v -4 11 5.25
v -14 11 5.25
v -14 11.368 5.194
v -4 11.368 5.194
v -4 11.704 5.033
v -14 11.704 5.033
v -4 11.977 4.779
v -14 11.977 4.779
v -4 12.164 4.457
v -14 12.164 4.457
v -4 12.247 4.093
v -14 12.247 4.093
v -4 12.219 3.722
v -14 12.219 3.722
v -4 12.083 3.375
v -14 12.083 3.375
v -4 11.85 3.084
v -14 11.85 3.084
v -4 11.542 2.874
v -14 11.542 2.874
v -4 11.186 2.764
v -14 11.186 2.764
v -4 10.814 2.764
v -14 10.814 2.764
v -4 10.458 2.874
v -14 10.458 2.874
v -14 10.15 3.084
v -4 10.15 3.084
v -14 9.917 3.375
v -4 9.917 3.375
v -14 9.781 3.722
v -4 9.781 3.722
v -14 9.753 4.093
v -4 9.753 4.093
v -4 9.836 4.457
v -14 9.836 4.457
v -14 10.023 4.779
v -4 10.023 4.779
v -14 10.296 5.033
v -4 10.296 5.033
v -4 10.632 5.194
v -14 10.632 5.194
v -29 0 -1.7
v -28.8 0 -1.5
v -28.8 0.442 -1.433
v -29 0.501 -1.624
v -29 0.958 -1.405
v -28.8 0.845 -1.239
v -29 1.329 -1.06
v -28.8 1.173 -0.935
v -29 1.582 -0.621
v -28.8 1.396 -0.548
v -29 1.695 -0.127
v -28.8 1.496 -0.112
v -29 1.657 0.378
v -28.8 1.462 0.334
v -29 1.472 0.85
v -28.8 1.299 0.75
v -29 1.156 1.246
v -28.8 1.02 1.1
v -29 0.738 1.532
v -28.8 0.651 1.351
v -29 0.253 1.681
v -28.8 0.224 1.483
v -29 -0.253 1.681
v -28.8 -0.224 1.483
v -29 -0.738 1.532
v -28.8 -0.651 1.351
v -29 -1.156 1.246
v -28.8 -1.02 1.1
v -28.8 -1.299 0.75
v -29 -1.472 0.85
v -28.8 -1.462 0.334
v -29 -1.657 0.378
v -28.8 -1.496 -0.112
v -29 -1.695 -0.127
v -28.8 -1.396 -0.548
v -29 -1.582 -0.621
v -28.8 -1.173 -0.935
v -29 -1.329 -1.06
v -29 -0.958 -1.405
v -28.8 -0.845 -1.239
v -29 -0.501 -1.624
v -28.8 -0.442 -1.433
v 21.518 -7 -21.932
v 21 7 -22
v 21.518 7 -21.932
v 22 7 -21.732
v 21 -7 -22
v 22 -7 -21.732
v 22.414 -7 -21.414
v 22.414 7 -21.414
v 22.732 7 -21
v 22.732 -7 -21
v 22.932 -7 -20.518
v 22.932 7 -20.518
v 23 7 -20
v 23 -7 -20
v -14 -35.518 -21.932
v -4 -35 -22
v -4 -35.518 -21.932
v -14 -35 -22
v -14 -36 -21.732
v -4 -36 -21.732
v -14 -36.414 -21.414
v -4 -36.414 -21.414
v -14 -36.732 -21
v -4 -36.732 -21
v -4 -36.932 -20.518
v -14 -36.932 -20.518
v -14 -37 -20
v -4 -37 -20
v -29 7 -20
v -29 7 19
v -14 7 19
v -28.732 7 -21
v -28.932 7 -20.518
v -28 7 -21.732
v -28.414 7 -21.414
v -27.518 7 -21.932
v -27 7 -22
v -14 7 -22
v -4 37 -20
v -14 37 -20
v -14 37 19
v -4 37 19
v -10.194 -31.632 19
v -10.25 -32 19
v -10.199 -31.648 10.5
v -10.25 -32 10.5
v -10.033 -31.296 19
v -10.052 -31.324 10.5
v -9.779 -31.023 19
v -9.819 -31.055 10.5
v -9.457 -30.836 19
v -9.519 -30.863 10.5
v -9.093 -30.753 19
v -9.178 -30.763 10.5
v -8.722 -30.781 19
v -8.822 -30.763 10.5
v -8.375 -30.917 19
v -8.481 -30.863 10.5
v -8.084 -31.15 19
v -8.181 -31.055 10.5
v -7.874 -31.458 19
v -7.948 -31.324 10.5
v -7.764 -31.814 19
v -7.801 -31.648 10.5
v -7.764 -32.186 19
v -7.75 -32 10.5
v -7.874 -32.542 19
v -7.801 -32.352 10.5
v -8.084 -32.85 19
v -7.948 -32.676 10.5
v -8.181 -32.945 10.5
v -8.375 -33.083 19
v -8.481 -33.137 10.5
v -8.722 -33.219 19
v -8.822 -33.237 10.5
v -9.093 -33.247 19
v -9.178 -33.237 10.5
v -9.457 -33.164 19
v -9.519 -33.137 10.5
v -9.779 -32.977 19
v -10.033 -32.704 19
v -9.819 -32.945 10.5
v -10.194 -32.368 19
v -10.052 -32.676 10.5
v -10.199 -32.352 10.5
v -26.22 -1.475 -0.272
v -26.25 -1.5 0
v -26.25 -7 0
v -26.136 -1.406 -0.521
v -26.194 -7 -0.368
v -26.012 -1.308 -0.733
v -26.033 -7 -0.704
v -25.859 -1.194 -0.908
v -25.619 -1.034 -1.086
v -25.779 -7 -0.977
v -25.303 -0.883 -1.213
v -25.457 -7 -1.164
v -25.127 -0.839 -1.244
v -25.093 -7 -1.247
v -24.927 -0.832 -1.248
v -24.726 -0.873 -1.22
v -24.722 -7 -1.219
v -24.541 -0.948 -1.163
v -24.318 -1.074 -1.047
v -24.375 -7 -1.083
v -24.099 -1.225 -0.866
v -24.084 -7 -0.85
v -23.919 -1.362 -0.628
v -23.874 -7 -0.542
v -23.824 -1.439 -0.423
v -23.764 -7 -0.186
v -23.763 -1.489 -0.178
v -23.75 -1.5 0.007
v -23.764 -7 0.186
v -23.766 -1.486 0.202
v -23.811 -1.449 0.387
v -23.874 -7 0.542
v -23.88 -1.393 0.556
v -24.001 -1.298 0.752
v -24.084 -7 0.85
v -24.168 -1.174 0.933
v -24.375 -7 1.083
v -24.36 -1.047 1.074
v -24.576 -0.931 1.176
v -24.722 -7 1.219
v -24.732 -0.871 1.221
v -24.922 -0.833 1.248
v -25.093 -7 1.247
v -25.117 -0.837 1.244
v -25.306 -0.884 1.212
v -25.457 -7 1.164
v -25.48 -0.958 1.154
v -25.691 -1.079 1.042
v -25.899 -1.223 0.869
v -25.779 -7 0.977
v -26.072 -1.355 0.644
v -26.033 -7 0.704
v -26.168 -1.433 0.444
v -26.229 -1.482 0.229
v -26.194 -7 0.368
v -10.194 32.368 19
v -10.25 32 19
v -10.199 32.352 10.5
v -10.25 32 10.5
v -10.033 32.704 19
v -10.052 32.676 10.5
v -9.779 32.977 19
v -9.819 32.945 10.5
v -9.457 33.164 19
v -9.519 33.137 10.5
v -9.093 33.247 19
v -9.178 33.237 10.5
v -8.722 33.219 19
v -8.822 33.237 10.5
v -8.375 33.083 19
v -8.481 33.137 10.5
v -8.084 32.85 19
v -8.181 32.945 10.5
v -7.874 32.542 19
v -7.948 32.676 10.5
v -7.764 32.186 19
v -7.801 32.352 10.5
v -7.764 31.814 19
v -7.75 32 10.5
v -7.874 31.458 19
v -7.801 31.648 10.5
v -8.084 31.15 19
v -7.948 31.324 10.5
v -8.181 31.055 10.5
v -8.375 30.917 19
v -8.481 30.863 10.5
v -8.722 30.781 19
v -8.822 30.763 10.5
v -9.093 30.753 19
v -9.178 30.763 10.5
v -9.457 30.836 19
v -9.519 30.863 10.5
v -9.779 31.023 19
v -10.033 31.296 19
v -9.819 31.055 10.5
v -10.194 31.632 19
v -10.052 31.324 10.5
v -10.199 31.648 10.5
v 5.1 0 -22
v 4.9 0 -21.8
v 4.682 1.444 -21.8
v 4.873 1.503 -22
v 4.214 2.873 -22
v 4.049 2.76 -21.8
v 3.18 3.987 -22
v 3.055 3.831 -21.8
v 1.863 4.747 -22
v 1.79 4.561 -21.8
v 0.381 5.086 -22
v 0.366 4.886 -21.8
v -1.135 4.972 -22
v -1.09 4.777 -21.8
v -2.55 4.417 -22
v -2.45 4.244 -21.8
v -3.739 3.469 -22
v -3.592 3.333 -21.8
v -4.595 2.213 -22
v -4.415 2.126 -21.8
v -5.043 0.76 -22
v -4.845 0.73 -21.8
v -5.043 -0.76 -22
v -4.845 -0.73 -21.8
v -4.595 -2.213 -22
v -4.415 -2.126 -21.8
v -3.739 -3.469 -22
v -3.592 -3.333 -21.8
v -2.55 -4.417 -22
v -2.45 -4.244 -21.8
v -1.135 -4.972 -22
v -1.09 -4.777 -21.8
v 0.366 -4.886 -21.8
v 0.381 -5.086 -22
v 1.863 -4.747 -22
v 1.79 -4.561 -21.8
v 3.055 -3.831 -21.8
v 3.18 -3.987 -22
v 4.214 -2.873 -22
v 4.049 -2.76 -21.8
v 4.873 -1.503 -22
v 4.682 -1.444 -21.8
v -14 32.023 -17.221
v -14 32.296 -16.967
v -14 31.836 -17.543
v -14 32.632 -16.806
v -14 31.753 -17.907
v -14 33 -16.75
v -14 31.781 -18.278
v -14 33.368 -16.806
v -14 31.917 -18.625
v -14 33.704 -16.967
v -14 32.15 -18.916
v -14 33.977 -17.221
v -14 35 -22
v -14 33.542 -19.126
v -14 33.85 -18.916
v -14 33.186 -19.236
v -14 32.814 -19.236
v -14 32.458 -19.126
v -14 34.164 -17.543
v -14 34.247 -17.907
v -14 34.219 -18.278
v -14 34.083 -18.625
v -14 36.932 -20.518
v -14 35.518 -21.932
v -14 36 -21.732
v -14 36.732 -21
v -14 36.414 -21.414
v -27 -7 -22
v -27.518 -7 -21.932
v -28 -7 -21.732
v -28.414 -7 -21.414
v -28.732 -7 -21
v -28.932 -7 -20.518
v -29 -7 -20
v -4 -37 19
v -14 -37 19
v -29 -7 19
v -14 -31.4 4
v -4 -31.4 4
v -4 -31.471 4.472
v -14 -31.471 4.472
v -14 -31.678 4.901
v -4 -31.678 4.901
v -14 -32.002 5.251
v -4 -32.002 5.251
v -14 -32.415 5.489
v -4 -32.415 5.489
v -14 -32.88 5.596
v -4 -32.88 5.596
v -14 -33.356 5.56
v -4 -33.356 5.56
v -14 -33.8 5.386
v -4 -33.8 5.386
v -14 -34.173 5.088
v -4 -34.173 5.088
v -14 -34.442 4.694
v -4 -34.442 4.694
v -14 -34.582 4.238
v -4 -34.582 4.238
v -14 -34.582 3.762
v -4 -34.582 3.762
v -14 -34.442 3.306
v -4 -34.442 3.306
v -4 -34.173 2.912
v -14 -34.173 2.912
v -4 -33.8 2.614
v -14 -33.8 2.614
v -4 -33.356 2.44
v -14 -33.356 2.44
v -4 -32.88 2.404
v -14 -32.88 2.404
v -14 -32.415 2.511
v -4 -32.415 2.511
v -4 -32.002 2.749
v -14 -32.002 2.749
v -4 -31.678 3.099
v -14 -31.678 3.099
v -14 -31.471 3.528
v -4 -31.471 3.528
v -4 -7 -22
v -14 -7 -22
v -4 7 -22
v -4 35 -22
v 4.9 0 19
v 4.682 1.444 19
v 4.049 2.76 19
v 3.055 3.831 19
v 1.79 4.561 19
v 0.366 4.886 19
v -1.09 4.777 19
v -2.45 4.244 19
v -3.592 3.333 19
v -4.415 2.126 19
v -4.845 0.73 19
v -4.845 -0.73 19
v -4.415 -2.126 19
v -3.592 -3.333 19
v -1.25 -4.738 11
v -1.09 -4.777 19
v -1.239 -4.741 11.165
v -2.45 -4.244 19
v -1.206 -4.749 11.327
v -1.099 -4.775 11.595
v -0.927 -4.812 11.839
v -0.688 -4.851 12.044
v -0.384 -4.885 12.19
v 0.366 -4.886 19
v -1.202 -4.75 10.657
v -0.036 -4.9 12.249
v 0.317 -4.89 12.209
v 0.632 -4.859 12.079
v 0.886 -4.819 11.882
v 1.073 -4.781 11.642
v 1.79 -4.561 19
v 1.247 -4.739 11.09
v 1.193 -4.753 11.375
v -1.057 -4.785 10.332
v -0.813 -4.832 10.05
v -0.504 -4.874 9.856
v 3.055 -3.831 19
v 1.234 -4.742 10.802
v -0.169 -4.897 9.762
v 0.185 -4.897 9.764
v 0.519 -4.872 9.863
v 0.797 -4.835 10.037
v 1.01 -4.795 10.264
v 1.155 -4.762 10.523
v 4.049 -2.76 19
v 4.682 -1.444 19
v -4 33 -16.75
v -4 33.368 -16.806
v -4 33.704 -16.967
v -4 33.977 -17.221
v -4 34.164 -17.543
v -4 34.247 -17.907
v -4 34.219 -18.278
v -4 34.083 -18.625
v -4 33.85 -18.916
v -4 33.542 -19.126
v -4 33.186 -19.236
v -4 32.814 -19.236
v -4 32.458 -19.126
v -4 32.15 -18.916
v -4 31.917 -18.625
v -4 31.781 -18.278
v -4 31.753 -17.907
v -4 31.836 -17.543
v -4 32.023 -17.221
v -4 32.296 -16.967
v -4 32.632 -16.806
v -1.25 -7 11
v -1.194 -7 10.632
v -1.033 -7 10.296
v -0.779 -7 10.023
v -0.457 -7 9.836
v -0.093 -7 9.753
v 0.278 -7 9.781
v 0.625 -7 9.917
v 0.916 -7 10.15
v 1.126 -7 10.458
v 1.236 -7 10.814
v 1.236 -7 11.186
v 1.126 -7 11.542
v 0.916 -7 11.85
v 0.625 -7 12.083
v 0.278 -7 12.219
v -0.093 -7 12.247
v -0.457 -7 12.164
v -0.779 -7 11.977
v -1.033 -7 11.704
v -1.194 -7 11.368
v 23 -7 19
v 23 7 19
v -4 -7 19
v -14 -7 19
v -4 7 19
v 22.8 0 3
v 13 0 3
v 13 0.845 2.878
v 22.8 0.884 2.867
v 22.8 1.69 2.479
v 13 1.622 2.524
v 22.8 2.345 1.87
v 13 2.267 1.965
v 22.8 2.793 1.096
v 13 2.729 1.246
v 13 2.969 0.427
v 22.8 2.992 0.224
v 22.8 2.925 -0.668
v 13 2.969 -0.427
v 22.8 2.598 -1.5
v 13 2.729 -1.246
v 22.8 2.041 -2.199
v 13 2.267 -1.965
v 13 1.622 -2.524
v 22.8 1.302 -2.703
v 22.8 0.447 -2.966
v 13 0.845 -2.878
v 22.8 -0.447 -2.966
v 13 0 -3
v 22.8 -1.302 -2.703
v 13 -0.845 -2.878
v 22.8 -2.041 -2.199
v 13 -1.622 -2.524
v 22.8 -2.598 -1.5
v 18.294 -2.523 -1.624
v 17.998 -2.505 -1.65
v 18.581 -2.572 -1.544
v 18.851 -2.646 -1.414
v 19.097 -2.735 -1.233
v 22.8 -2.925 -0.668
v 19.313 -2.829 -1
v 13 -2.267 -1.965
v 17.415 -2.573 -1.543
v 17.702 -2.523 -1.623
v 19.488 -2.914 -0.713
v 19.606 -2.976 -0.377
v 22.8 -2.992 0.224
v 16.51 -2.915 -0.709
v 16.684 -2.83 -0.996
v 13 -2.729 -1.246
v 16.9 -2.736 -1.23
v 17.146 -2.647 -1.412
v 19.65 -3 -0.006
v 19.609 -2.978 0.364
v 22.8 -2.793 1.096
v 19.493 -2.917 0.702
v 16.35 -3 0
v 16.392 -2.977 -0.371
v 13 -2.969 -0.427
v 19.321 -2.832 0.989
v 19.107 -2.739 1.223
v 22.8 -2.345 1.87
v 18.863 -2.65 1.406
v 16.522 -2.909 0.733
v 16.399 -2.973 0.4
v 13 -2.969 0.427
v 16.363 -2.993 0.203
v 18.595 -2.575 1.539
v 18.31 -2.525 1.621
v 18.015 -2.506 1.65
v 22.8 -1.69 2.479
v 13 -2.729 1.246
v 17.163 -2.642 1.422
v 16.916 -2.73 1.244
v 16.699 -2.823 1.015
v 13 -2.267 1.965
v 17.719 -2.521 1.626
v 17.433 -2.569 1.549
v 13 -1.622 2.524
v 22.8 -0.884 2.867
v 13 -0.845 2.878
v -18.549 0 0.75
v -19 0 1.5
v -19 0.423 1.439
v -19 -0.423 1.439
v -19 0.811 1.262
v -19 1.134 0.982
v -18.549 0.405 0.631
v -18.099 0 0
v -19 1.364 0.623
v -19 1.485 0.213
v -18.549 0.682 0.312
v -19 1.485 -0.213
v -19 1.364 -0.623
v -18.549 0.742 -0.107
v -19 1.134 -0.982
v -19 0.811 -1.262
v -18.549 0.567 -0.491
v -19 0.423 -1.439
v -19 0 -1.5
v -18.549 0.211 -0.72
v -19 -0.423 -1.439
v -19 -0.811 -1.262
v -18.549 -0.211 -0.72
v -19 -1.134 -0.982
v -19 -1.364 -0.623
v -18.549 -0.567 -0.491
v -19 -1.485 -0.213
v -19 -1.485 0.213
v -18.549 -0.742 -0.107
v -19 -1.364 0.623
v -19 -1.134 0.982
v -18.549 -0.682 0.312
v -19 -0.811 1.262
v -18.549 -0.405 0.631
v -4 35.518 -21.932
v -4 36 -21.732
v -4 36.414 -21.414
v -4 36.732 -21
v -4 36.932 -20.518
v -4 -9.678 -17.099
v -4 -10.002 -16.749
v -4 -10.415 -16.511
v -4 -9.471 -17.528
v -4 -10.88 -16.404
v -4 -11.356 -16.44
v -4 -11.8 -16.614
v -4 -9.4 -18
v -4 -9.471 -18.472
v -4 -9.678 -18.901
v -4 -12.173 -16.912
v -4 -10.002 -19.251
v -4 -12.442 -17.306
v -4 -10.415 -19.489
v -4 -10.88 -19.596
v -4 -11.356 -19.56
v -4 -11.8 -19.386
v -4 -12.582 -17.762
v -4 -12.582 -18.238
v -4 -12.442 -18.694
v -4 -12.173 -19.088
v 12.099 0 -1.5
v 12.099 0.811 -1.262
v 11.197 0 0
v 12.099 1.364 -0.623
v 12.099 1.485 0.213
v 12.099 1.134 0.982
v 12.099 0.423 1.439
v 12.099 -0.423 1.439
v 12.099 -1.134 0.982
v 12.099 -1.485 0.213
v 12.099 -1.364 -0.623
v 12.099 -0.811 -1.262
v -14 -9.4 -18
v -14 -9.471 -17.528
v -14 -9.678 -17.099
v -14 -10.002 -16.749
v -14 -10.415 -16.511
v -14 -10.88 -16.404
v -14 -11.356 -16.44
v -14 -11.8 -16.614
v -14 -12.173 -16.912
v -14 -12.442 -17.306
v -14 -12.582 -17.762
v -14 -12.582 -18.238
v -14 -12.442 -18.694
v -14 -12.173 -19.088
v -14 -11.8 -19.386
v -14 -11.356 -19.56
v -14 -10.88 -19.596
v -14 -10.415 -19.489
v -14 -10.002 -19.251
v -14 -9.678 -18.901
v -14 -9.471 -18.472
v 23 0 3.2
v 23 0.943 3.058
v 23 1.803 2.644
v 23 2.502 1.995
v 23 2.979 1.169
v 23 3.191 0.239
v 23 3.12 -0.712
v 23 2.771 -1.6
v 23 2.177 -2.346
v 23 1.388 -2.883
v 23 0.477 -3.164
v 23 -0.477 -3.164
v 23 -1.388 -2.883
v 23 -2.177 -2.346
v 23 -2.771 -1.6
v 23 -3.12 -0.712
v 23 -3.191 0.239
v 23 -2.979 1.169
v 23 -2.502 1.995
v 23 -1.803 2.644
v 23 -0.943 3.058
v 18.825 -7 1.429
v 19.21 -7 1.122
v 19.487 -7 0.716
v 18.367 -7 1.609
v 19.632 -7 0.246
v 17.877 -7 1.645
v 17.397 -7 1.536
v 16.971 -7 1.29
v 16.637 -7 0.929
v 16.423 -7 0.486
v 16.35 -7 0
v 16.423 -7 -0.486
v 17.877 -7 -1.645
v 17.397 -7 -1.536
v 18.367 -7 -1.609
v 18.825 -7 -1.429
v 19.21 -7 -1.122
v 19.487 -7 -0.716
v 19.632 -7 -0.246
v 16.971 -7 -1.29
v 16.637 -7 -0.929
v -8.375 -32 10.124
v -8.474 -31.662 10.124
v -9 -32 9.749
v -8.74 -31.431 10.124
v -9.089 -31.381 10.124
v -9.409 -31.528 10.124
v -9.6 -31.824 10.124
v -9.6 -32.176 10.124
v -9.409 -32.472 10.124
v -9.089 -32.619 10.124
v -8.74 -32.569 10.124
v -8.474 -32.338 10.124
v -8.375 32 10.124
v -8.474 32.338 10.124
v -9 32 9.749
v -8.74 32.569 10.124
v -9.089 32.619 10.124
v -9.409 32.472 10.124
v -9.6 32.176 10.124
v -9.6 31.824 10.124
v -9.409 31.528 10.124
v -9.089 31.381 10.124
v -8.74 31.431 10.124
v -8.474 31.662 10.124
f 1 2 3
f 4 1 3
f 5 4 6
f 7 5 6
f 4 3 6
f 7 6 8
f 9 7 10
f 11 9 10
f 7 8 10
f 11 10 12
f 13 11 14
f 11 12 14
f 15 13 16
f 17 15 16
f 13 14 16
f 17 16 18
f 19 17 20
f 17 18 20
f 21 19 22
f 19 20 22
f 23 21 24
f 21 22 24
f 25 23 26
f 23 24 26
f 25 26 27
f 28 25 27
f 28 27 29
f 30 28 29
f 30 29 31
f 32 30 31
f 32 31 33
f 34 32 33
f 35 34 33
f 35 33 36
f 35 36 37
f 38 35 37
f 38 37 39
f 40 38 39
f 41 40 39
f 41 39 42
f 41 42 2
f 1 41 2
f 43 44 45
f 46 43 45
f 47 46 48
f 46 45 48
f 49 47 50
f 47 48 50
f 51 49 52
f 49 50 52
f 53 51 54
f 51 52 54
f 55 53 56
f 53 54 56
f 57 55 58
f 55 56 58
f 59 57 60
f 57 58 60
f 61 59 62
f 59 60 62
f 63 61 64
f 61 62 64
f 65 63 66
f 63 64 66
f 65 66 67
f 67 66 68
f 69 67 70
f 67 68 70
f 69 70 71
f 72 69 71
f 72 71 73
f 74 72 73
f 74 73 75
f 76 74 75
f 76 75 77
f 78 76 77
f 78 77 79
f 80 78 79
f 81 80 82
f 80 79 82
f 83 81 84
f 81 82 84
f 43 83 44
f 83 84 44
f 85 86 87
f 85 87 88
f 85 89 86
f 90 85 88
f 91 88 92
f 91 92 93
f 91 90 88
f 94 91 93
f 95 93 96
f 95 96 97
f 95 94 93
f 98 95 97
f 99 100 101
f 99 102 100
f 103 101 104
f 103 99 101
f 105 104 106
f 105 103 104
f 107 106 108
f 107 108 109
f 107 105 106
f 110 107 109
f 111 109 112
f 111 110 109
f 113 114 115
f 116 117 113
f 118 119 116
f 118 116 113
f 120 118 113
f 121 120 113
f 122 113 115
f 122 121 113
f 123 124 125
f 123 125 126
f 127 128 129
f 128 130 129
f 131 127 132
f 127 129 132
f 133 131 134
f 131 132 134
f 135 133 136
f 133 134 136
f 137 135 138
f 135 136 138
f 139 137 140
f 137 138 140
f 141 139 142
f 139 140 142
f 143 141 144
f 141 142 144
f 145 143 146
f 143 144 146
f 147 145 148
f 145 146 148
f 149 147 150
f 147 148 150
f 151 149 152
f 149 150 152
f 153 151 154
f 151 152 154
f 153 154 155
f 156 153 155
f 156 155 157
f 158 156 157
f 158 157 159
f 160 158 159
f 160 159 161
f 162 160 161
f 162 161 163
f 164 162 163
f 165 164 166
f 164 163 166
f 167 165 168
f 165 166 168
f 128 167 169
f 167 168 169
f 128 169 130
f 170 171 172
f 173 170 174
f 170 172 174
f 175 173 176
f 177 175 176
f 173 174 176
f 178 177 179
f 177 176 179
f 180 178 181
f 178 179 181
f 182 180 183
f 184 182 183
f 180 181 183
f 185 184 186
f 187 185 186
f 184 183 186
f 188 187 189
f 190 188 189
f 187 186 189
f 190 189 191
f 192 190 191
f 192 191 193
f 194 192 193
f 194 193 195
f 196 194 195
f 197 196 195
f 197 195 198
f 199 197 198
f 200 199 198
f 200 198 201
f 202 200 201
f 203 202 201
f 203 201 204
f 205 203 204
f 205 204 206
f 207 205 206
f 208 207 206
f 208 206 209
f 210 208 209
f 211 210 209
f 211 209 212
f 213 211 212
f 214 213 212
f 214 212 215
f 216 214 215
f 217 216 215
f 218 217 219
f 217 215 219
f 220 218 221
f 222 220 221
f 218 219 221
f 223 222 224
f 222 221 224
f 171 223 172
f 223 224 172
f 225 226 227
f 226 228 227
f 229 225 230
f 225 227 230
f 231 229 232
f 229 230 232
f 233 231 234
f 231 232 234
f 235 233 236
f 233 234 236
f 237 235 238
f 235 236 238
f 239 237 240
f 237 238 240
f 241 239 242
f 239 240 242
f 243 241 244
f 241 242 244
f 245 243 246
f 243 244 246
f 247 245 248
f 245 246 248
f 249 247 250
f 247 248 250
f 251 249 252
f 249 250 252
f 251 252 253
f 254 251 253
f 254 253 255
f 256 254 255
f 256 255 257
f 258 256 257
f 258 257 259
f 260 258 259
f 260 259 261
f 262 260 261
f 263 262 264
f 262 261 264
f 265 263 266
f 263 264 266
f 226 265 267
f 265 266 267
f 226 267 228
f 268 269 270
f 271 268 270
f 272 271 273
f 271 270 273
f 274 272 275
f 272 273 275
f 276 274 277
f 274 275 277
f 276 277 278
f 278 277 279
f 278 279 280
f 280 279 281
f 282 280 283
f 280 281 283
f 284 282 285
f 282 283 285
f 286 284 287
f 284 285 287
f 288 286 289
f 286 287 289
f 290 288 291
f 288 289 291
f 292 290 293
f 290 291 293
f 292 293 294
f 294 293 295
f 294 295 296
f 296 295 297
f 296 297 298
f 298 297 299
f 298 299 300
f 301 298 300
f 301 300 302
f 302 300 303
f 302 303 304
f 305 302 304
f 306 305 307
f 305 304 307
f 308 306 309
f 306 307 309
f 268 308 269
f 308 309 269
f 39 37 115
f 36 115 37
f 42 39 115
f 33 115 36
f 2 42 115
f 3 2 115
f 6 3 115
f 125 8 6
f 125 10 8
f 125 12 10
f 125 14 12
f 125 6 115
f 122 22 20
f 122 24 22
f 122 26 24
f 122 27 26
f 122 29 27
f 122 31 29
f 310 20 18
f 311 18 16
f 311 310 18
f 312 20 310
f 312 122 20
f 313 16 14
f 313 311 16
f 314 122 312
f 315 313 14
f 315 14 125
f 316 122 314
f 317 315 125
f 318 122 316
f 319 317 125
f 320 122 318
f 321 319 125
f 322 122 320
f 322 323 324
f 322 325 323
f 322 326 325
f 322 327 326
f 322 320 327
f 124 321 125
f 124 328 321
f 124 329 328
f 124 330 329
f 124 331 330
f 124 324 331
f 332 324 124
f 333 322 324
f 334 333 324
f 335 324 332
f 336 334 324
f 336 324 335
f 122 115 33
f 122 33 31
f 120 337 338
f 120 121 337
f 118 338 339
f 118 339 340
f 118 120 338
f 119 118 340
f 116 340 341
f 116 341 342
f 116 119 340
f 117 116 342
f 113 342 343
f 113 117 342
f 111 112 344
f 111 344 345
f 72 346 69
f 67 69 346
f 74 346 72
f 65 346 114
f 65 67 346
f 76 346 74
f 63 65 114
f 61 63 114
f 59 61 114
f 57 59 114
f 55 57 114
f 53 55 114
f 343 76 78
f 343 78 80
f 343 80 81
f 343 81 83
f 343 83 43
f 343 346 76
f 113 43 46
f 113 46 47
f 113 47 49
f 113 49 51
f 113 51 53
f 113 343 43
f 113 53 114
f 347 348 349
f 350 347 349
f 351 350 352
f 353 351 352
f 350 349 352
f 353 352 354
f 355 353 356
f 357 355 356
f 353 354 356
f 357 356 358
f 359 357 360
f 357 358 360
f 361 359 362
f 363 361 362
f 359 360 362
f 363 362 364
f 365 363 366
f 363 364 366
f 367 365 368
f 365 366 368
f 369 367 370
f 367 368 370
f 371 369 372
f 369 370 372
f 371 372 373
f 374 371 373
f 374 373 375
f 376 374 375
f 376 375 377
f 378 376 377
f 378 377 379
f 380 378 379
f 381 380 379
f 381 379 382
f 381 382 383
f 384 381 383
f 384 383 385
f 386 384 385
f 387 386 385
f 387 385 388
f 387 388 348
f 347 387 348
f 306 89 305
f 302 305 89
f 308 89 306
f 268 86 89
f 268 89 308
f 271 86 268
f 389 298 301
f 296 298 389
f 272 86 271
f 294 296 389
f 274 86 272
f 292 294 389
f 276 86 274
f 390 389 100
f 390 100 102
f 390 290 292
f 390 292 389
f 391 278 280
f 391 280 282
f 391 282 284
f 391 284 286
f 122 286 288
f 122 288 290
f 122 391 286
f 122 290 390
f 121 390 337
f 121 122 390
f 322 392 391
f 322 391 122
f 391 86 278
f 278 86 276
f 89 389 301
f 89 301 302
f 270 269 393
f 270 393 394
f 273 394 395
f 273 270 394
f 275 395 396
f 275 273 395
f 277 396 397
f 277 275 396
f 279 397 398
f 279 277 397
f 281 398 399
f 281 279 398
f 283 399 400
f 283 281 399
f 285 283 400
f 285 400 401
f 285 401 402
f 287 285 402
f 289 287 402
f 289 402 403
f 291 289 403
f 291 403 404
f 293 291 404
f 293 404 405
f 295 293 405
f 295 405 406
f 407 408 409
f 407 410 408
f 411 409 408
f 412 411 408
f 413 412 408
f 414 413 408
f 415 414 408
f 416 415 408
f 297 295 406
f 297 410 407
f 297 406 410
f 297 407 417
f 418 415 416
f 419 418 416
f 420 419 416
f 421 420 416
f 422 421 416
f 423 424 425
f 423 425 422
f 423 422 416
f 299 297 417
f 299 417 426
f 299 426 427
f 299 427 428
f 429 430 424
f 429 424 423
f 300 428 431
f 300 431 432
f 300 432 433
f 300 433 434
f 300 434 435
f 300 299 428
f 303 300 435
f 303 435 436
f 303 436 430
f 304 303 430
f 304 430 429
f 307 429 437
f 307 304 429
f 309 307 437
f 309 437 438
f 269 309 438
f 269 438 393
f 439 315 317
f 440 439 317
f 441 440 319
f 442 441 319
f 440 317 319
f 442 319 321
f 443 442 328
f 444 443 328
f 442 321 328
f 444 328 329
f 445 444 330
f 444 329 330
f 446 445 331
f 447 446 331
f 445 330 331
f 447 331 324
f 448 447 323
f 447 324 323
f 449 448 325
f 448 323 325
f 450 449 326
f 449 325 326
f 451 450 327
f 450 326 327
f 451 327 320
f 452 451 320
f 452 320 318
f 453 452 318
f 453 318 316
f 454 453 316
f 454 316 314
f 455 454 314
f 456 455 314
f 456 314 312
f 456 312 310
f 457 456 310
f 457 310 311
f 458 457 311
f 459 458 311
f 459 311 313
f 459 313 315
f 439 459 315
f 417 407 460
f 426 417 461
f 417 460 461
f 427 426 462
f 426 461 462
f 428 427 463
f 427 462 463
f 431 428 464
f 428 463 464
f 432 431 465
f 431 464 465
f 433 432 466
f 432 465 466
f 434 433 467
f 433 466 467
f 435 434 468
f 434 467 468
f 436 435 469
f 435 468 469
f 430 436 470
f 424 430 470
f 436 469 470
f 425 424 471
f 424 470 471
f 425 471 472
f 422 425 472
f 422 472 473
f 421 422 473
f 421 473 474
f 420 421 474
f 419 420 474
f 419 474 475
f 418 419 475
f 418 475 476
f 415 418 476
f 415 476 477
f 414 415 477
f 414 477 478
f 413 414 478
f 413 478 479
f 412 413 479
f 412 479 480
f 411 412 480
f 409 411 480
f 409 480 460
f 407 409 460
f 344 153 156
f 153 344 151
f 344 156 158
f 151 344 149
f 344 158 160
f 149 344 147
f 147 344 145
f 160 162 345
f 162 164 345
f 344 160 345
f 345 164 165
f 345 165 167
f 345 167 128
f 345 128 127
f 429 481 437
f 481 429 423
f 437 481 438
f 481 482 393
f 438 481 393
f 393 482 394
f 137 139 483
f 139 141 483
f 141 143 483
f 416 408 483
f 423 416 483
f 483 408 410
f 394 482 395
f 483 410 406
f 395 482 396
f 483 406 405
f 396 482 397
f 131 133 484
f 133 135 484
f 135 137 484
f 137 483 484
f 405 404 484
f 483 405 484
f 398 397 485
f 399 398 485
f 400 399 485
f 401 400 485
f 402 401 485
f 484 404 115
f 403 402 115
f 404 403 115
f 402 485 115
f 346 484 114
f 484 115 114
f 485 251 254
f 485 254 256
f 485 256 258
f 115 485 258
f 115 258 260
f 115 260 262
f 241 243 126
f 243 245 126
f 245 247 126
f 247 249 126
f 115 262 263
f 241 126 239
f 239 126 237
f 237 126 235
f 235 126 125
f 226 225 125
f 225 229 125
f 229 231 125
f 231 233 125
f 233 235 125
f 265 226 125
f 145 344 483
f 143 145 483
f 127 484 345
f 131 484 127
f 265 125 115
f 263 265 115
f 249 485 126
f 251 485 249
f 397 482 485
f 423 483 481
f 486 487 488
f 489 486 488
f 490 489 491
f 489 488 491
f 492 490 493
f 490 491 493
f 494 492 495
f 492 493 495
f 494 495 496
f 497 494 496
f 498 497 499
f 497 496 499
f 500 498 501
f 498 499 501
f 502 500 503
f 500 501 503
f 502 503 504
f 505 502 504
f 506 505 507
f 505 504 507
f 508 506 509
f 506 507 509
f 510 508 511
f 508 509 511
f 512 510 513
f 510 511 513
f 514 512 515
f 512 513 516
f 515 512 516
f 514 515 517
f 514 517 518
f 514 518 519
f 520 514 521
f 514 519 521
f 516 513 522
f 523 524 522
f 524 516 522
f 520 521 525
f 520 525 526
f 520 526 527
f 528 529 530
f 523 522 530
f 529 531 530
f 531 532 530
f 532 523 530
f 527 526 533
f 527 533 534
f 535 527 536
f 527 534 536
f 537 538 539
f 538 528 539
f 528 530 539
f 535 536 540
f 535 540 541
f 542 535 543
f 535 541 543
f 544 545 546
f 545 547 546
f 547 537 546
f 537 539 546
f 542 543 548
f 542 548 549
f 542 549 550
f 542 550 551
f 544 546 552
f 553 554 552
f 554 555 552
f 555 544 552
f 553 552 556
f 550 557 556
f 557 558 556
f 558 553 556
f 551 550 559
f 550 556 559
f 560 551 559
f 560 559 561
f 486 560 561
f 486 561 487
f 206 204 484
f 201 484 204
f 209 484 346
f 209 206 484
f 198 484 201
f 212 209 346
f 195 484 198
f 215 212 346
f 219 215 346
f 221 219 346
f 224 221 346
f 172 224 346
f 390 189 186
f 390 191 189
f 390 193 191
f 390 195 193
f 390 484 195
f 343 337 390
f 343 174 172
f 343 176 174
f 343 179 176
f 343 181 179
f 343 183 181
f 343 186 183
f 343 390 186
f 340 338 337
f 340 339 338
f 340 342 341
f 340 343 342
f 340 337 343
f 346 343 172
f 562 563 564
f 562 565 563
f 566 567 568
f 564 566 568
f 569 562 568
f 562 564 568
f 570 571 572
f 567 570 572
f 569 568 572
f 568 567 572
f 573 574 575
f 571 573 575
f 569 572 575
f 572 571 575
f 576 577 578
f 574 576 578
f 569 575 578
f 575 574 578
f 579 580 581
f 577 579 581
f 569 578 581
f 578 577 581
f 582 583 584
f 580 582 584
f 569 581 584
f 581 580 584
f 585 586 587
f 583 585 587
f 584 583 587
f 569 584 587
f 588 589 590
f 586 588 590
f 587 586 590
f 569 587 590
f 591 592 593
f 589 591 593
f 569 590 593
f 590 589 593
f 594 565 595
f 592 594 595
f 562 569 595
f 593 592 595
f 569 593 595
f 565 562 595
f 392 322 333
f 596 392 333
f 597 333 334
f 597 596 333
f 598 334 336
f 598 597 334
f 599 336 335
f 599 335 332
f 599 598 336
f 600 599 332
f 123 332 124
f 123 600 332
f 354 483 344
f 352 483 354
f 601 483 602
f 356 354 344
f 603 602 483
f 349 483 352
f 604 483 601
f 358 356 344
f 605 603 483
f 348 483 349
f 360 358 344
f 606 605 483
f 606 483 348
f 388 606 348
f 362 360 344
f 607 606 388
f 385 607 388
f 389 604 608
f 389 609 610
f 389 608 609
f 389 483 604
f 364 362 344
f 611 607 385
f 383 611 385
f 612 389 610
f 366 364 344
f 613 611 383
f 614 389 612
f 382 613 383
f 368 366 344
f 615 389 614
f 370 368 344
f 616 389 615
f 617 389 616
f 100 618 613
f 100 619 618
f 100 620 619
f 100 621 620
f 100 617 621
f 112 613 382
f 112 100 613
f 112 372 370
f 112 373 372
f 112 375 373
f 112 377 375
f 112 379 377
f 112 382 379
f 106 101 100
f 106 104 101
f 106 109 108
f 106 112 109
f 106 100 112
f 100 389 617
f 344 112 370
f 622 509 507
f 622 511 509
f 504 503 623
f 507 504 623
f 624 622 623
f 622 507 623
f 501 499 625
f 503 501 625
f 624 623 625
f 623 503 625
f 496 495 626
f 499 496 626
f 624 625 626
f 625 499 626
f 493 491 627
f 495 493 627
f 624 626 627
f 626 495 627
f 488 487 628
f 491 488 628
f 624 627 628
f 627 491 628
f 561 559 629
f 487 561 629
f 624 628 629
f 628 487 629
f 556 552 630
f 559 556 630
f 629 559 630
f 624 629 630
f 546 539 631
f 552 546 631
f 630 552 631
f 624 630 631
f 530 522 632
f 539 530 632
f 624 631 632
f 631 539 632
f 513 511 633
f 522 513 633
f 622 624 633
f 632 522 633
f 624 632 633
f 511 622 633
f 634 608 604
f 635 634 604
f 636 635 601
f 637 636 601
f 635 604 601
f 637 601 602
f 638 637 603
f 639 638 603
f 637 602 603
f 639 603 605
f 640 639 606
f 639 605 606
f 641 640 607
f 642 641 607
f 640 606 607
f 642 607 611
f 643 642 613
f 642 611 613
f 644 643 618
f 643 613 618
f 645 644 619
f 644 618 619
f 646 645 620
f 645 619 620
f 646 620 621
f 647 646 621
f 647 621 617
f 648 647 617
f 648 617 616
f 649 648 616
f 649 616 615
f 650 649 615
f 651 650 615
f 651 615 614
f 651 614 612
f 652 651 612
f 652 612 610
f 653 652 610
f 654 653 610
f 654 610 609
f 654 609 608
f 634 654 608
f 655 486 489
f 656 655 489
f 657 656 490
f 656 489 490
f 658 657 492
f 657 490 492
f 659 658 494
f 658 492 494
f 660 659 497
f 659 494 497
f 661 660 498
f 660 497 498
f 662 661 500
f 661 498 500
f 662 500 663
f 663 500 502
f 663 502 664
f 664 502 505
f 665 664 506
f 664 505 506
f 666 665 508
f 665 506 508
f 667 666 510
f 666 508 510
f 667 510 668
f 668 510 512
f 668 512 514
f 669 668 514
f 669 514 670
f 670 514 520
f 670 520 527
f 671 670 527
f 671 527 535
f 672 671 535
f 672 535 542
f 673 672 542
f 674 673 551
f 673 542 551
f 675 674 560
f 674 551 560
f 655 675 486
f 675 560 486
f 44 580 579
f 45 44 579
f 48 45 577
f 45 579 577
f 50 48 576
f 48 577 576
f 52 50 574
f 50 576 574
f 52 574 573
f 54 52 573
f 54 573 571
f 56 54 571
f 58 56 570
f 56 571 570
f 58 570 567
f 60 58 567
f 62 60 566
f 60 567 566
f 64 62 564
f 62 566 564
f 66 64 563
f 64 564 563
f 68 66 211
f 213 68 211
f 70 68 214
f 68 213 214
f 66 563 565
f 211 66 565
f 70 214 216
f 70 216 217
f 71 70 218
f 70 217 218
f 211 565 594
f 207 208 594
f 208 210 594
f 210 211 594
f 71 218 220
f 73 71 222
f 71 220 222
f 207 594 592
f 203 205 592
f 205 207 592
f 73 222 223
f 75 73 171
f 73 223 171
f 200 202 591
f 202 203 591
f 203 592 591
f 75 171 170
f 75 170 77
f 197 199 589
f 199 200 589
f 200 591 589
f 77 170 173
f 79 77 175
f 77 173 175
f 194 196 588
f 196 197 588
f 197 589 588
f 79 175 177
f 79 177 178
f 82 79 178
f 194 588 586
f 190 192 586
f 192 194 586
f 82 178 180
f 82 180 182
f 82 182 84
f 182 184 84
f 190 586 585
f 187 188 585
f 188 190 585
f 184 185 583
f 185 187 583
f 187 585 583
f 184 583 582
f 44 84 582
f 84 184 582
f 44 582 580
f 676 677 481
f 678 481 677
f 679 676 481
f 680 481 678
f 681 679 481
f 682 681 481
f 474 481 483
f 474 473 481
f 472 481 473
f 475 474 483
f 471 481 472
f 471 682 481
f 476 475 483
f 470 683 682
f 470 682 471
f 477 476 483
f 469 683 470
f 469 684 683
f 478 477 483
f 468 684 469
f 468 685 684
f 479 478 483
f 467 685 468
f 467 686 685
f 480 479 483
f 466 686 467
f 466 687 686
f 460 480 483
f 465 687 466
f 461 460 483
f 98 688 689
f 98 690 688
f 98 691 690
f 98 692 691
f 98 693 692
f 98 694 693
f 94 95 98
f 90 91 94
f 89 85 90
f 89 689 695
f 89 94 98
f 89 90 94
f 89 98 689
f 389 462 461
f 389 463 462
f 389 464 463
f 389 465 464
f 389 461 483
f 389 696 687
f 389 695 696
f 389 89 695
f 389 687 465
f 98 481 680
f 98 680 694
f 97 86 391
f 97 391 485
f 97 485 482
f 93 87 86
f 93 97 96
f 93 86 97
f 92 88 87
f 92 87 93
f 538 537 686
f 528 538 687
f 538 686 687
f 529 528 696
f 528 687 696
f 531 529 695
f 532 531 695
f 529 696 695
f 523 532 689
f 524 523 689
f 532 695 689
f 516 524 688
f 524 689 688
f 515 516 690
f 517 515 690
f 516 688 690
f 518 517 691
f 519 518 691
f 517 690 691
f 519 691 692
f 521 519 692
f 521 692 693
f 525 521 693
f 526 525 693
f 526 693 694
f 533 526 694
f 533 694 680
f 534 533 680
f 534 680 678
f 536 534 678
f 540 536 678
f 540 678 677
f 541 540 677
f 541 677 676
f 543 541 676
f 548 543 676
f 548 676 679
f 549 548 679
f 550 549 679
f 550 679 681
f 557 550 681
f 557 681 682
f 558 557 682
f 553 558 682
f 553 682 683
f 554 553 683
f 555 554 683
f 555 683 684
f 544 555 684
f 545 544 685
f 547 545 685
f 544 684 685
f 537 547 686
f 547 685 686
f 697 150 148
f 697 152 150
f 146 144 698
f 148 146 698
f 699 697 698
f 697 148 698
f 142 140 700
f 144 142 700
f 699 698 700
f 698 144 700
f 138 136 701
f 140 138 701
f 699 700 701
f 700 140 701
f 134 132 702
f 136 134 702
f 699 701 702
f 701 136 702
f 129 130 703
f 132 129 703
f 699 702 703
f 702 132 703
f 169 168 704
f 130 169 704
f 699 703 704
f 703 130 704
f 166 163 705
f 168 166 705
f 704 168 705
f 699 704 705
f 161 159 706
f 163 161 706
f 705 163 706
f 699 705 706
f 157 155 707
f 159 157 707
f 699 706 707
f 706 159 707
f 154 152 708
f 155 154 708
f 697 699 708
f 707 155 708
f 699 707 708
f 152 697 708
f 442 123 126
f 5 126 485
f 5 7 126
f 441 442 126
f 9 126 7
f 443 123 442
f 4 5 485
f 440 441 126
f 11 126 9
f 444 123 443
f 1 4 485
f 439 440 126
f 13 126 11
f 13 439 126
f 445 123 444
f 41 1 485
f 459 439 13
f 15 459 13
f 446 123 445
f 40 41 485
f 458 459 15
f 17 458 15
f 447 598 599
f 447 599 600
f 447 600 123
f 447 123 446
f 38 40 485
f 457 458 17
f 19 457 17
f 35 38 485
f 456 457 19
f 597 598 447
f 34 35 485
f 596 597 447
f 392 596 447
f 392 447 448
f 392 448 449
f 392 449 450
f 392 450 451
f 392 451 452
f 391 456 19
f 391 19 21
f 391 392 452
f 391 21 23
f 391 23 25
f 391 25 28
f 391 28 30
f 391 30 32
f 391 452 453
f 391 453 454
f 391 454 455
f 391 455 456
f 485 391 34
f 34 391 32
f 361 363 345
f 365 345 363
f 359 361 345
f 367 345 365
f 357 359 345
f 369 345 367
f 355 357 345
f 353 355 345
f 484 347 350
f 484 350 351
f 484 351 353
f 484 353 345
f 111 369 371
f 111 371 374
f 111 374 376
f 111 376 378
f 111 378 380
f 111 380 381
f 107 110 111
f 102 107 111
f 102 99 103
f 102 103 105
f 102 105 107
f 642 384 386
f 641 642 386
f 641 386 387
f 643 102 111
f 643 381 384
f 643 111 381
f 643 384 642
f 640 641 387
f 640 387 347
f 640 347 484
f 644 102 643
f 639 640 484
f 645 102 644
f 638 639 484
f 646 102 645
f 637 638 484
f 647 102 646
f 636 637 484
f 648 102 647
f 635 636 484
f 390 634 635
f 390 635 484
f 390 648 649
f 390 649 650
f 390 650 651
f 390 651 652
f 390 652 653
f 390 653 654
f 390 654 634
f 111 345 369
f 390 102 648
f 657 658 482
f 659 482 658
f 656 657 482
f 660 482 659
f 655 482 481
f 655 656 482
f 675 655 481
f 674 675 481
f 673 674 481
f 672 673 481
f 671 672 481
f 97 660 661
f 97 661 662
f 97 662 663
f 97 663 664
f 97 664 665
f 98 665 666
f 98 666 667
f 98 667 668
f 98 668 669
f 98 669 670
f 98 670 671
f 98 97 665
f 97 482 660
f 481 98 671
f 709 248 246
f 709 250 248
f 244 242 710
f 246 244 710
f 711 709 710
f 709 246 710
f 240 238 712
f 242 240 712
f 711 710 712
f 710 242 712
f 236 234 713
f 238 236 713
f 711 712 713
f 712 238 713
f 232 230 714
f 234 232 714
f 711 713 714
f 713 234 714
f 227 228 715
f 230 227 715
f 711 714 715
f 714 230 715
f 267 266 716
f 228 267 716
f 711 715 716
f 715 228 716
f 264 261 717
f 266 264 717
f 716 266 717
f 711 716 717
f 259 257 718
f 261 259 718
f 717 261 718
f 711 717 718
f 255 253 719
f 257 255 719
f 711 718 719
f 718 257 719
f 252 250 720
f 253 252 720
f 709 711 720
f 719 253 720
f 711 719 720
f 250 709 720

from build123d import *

# Parameters (mm, degrees)
BOSS_EXTRU_1_DEPTH                = 19
BOSS_EXTRU_1_DEPTH_BACK           = 22
ESQUISSE1_R                       = 4.9
DIAM_TRE_DU_PER_AGE_6_0_6_1_D     = 6
DIAM_TRE_DU_PER_AGE_6_0_6_1_DEPTH = 10
DIAM_TRE_DU_PER_AGE_6_0_6_1_TIP   = 1.802581857
ENL_V_MAT_EXTRU_1_REACH           = 52.813
ESQUISSE6_R                       = 1.6
DIAM_TRE_DU_PER_AGE_3_0_3_1_D     = 3
DIAM_TRE_DU_PER_AGE_3_0_3_1_DEPTH = 10
DIAM_TRE_DU_PER_AGE_3_0_3_1_TIP   = 0.901290929
TROU_TARAUD_M31_D                 = 2.5
TROU_TARAUD_M31_DEPTH             = 8.5
TROU_TARAUD_M31_TIP               = 0.751075774
CONG_1_R                          = 2
TROU_TARAUD_M32_REACH             = 59.105
TROU_TARAUD_M32_BORE_R            = 1.25
TROU_TARAUD_M41_REACH             = 59.105
TROU_TARAUD_M41_BORE_R            = 1.65
CHANFREIN1_SIZE                   = 0.2
TROU_TARAUD_M33_D                 = 2.5


with BuildPart() as part:
    # Esquisse1 → Boss.-Extru.1 (new, two sides: drawn at the far end of the back side and taken through both)
    with BuildSketch(Plane.XY.offset(-BOSS_EXTRU_1_DEPTH_BACK)):
        Polygon((-4, -7), (-4, -37), (-14, -37), (-14, -7), (-29, -7), (-29, 7), (-14, 7), (-14, 37), (-4, 37), (-4, 7), (23, 7), (23, -7), align=None)
        Circle(ESQUISSE1_R, mode=Mode.SUBTRACT)
    extrude(amount=BOSS_EXTRU_1_DEPTH + BOSS_EXTRU_1_DEPTH_BACK)

    # Diamètre du perçage Ø6.0 (6)1
    with Locations(Plane(origin=(23, 0, 0), x_dir=(0, 0, -1), z_dir=(1, 0, 0))):
        with Locations((0, 0)):
            Hole(DIAM_TRE_DU_PER_AGE_6_0_6_1_D / 2, depth=DIAM_TRE_DU_PER_AGE_6_0_6_1_DEPTH)
            with Locations((0, 0, -(DIAM_TRE_DU_PER_AGE_6_0_6_1_DEPTH + DIAM_TRE_DU_PER_AGE_6_0_6_1_TIP / 2))):  # 118° drill point
                Cone(0, DIAM_TRE_DU_PER_AGE_6_0_6_1_D / 2, DIAM_TRE_DU_PER_AGE_6_0_6_1_TIP, mode=Mode.SUBTRACT)

    # Esquisse6 → Enlèv. mat.-Extru.1 (cut, up to next)
    with BuildSketch(Plane(origin=(-4, 0, 0), x_dir=(0, 0, -1), z_dir=(1, 0, 0)), mode=Mode.PRIVATE) as enl_v_mat_extru_1_sk1:
        with Locations(Location((18, -11, 0), (0, 0, 90))):
            Circle(ESQUISSE6_R)
    enl_v_mat_extru_1_tool1 = extrude(enl_v_mat_extru_1_sk1.sketch, amount=-ENL_V_MAT_EXTRU_1_REACH, mode=Mode.PRIVATE) & part.part
    # Esquisse6 → Enlèv. mat.-Extru.1 (cut, up to next)
    with BuildSketch(Plane(origin=(-4, 0, 0), x_dir=(0, 0, -1), z_dir=(1, 0, 0)), mode=Mode.PRIVATE) as enl_v_mat_extru_1_sk2:
        with Locations(Location((-4, -33, 0), (0, 0, 90))):
            Circle(ESQUISSE6_R)
    enl_v_mat_extru_1_tool2 = extrude(enl_v_mat_extru_1_sk2.sketch, amount=-ENL_V_MAT_EXTRU_1_REACH, mode=Mode.PRIVATE) & part.part
    add(enl_v_mat_extru_1_tool1.solids().sort_by_distance((-4, -11, -18))[0], mode=Mode.SUBTRACT)
    add(enl_v_mat_extru_1_tool2.solids().sort_by_distance((-4, -33, 4))[0], mode=Mode.SUBTRACT)

    # Diamètre du perçage Ø3.0 (3)1
    with Locations(Plane.ZY.offset(29)):
        with Locations((0, 0)):
            Hole(DIAM_TRE_DU_PER_AGE_3_0_3_1_D / 2, depth=DIAM_TRE_DU_PER_AGE_3_0_3_1_DEPTH)
            with Locations((0, 0, -(DIAM_TRE_DU_PER_AGE_3_0_3_1_DEPTH + DIAM_TRE_DU_PER_AGE_3_0_3_1_TIP / 2))):  # 118° drill point
                Cone(0, DIAM_TRE_DU_PER_AGE_3_0_3_1_D / 2, DIAM_TRE_DU_PER_AGE_3_0_3_1_TIP, mode=Mode.SUBTRACT)

    # Trou taraudé M31
    with Locations(Plane.XY.offset(19)):
        with Locations((-9, 32), (-9, -32)):
            Hole(TROU_TARAUD_M31_D / 2, depth=TROU_TARAUD_M31_DEPTH)
            with Locations((0, 0, -(TROU_TARAUD_M31_DEPTH + TROU_TARAUD_M31_TIP / 2))):  # 118° drill point
                Cone(0, TROU_TARAUD_M31_D / 2, TROU_TARAUD_M31_TIP, mode=Mode.SUBTRACT)

    # Congé1
    cong_1_edges = [part.edges().sort_by_distance(p)[0] for p in [
        (-29, 0, -22),
        (-9, -37, -22),
        (23, 0, -22),
        (-9, 37, -22),
    ]]
    fillet(cong_1_edges, radius=CONG_1_R)

    # Trou taraudé M32 bore → Trou taraudé M32 (cut, up to next)
    with BuildSketch(Plane(origin=(0, -7, 0), x_dir=(-1, 0, 0), z_dir=(0, -1, 0)), mode=Mode.PRIVATE) as trou_taraud_m32_sk1:
        with Locations((25, 0)):
            Circle(TROU_TARAUD_M32_BORE_R)
    trou_taraud_m32_tool1 = extrude(trou_taraud_m32_sk1.sketch, amount=-TROU_TARAUD_M32_REACH, mode=Mode.PRIVATE) & part.part
    # Trou taraudé M32 bore → Trou taraudé M32 (cut, up to next)
    with BuildSketch(Plane(origin=(0, -7, 0), x_dir=(-1, 0, 0), z_dir=(0, -1, 0)), mode=Mode.PRIVATE) as trou_taraud_m32_sk2:
        with Locations((0, -11)):
            Circle(TROU_TARAUD_M32_BORE_R)
    trou_taraud_m32_tool2 = extrude(trou_taraud_m32_sk2.sketch, amount=-TROU_TARAUD_M32_REACH, mode=Mode.PRIVATE) & part.part
    add(trou_taraud_m32_tool1.solids().sort_by_distance((-25, -7, 0))[0], mode=Mode.SUBTRACT)
    add(trou_taraud_m32_tool2.solids().sort_by_distance((0, -7, 11))[0], mode=Mode.SUBTRACT)

    # Trou taraudé M41 bore → Trou taraudé M41 (cut, up to next)
    with BuildSketch(Plane(origin=(0, -7, 0), x_dir=(-1, 0, 0), z_dir=(0, -1, 0)), mode=Mode.PRIVATE) as trou_taraud_m41_sk1:
        with Locations((-18, 0)):
            Circle(TROU_TARAUD_M41_BORE_R)
    trou_taraud_m41_tool1 = extrude(trou_taraud_m41_sk1.sketch, amount=-TROU_TARAUD_M41_REACH, mode=Mode.PRIVATE) & part.part
    add(trou_taraud_m41_tool1.solids().sort_by_distance((18, -7, 0))[0], mode=Mode.SUBTRACT)

    # Chanfrein1
    chanfrein1_edges = [part.edges().sort_by_distance(p)[0] for p in [
        (-4.9, 0, -22),
        (23, 0, -3),
        (-29, 0, 1.5),
    ]]
    chamfer(chanfrein1_edges, length=CHANFREIN1_SIZE)

    # Trou taraudé M33 (through all)
    with Locations(Plane(origin=(-4, 0, 0), x_dir=(0, 0, -1), z_dir=(1, 0, 0))):
        with Locations((18, 33), (-4, 11)):
            Hole(TROU_TARAUD_M33_D / 2)


solid = part.part
